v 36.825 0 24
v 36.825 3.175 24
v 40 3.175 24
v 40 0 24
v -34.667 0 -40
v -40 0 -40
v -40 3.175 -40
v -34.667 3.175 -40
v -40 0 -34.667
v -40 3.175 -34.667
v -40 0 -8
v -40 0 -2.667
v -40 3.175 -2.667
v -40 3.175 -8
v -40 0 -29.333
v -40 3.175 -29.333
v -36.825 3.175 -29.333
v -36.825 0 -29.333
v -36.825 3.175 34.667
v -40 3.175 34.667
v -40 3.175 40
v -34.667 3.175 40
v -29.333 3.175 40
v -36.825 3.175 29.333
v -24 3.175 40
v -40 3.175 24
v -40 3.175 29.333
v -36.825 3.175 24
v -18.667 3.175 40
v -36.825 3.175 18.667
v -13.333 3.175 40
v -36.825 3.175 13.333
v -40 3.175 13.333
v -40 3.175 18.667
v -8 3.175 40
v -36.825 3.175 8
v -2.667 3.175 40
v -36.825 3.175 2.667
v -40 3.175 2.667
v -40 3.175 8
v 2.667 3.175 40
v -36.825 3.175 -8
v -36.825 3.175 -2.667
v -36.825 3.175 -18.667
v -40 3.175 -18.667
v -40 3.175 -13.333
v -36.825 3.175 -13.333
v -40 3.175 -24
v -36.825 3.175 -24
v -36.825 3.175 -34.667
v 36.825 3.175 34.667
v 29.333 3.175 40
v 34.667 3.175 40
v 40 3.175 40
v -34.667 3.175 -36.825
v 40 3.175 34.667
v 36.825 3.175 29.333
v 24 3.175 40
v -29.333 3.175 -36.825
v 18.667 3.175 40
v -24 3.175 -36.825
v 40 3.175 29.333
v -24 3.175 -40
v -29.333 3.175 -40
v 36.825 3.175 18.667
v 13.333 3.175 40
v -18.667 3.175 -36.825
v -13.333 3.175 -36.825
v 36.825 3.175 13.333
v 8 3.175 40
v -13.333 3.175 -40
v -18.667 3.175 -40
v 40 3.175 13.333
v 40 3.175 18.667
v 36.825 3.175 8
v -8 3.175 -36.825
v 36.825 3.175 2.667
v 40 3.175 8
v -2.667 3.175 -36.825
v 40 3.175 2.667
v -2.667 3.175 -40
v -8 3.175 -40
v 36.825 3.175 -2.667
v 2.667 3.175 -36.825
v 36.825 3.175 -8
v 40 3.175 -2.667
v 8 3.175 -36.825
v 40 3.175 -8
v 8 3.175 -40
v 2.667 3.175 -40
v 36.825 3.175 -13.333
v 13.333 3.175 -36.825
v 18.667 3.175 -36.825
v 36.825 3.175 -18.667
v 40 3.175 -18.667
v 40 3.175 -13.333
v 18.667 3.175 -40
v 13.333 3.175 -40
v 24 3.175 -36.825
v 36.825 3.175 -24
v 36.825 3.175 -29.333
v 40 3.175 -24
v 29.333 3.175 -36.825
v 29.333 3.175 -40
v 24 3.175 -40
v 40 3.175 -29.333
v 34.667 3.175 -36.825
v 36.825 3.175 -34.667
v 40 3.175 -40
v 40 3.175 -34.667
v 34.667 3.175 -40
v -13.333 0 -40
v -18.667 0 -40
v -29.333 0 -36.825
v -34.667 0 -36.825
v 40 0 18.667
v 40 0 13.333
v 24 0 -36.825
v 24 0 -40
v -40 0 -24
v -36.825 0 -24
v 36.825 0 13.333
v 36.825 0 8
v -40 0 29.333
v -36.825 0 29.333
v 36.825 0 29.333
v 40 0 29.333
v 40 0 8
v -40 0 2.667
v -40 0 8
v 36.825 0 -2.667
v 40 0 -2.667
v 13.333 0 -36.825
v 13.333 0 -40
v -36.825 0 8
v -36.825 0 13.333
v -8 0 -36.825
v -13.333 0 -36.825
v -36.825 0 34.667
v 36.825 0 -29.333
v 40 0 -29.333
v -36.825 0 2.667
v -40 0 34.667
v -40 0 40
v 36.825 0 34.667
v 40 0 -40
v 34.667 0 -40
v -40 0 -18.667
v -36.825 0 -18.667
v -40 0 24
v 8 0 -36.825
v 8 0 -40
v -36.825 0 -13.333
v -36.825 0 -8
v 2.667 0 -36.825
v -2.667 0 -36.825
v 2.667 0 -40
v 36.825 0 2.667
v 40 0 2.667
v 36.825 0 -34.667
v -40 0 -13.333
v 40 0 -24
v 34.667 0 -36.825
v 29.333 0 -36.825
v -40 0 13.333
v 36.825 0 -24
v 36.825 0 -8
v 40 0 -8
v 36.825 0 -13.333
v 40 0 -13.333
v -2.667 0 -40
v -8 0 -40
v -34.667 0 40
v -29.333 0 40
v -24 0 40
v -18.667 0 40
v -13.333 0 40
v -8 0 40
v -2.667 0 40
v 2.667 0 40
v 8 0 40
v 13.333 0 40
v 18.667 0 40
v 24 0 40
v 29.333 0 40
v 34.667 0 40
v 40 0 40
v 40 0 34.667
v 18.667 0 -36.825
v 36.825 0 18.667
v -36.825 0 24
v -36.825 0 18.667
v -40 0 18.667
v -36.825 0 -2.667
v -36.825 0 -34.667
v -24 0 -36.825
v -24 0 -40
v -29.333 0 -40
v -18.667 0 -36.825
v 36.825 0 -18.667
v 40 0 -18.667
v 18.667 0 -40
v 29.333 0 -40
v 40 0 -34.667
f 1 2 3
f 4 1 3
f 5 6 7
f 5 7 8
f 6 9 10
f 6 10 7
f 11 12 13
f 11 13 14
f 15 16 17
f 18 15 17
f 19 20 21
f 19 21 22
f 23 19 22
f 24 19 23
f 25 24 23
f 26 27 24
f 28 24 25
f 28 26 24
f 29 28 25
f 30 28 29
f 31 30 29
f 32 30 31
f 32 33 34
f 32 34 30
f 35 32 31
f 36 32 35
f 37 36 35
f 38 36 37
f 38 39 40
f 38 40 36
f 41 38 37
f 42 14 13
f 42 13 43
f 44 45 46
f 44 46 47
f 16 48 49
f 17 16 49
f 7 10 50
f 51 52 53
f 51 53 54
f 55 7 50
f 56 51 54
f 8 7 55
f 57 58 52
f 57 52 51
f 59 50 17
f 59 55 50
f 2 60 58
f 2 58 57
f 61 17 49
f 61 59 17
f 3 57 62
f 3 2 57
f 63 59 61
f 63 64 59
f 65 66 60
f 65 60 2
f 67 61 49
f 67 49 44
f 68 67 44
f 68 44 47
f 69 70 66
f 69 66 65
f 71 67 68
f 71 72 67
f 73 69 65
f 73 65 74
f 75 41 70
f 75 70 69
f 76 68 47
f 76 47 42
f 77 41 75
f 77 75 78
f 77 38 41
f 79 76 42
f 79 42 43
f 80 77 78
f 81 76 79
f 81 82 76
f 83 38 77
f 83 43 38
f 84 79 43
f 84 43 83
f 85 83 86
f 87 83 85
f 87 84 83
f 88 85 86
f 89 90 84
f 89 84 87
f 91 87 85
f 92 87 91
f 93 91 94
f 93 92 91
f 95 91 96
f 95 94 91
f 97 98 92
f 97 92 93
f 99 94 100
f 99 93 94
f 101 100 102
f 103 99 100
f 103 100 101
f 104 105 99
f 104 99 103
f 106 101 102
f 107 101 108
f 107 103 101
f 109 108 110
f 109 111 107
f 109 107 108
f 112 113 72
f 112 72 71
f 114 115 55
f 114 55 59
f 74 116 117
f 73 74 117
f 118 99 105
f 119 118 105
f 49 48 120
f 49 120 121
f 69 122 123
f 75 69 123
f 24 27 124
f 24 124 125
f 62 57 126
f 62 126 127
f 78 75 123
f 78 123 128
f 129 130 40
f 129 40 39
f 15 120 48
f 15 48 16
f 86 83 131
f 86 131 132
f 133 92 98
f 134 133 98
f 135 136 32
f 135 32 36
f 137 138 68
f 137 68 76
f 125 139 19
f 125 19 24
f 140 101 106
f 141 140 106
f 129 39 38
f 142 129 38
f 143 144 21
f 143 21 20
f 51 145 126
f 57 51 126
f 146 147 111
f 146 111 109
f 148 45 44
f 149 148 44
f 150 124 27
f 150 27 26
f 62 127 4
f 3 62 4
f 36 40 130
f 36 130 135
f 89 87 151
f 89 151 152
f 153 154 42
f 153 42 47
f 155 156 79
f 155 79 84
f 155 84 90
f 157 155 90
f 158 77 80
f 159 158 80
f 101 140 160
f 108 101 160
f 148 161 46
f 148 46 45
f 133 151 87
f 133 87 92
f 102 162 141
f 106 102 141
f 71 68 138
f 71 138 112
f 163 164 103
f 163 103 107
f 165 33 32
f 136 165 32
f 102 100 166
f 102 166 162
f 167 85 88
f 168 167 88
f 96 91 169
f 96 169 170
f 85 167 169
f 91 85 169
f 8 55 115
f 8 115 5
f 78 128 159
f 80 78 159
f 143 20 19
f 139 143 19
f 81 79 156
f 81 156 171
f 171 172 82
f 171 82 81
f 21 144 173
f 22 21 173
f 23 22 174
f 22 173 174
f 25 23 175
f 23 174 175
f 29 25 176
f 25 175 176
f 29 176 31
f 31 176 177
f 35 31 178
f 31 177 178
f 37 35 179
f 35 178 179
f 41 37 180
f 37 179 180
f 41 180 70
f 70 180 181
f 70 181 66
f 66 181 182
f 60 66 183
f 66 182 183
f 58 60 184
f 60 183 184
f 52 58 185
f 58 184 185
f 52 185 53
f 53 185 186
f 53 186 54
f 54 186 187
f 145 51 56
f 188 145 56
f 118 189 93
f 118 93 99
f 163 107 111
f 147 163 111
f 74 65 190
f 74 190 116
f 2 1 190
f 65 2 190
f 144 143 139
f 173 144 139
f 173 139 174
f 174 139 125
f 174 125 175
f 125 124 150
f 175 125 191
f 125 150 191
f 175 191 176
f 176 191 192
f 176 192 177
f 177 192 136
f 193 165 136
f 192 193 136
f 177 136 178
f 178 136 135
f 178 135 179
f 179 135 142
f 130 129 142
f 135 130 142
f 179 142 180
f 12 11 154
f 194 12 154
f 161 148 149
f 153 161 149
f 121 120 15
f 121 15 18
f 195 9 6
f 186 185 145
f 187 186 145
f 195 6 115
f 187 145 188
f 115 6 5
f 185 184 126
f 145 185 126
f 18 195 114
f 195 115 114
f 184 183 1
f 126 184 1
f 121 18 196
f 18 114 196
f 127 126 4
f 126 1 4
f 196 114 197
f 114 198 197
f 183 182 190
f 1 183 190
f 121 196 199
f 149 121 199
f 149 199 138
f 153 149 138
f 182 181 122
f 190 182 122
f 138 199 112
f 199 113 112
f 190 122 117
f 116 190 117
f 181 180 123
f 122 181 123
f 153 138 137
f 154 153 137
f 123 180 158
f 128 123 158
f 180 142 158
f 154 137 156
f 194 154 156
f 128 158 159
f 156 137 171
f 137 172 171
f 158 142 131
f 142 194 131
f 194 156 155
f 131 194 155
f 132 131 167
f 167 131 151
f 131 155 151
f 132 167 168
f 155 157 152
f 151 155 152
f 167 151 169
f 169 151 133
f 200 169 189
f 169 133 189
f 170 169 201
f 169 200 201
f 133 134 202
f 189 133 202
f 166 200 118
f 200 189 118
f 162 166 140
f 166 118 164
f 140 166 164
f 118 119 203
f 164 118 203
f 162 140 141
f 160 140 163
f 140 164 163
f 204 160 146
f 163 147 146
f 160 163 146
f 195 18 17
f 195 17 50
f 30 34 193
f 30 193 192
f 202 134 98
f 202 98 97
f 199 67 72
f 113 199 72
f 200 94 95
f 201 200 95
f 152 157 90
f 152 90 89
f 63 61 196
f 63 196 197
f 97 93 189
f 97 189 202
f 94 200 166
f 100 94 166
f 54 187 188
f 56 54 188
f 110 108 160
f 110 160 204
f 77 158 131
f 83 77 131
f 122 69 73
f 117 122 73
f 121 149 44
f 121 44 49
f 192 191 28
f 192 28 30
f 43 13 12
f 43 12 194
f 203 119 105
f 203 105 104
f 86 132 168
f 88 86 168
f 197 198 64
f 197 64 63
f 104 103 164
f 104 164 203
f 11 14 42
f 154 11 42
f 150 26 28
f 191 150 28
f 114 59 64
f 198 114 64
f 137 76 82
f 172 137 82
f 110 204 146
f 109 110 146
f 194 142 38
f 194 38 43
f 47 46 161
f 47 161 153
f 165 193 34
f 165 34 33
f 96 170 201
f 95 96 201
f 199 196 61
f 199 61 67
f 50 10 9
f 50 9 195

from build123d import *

# Parameters (mm, degrees)
SKETCH1_W                = 80
SKETCH1_H                = 80
BOSS_EXTRUDE1_DEPTH      = 3.175
CUT_EXTRUDE3_START       = -3.175
CUT_EXTRUDE3_OUTLINE_W   = 3.175
CUT_EXTRUDE3_OUTLINE_H   = 5.333333334
CUT_EXTRUDE3_OUTLINE_H_2 = 5.333333333
CUT_EXTRUDE3_OUTLINE_W_2 = 5.333333334
CUT_EXTRUDE3_OUTLINE_H_3 = 3.175
CUT_EXTRUDE3_OUTLINE_W_3 = 5.333333333
CUT_EXTRUDE3_DEPTH       = 3.175
SKETCH3_W                = 80
SKETCH3_H                = 5.333333333
BOSS_EXTRUDE2_DEPTH      = 3.175


# Read off the part's stored shape, not the designer's step: Cut-Extrude3
with BuildPart() as part:
    # Sketch1 → Boss-Extrude1 (new body)
    with BuildSketch(Plane(origin=(0, 0, 0), x_dir=(1, 0, 0), z_dir=(0, 1, 0))):
        Rectangle(SKETCH1_W, SKETCH1_H)
    extrude(amount=BOSS_EXTRUDE1_DEPTH)

    # Cut-Extrude3 outline → Cut-Extrude3 (cut)
    with BuildSketch(Plane(origin=(0, 3.175, 0), x_dir=(1, 0, 0), z_dir=(0, 1, 0)).offset(CUT_EXTRUDE3_START)):
        with Locations((-38.4125, 32)):
            Rectangle(CUT_EXTRUDE3_OUTLINE_W, CUT_EXTRUDE3_OUTLINE_H)
        with Locations((-38.4125, 21.333333334)):
            Rectangle(CUT_EXTRUDE3_OUTLINE_W, CUT_EXTRUDE3_OUTLINE_H_2)
        with Locations((-32, 38.4125)):
            Rectangle(CUT_EXTRUDE3_OUTLINE_W_2, CUT_EXTRUDE3_OUTLINE_H_3)
        with Locations((-38.4125, 10.666666666)):
            Rectangle(CUT_EXTRUDE3_OUTLINE_W, CUT_EXTRUDE3_OUTLINE_H_2)
        with Locations((-21.333333334, 38.4125)):
            Rectangle(CUT_EXTRUDE3_OUTLINE_W_3, CUT_EXTRUDE3_OUTLINE_H_3)
        with Locations((-38.4125, 0)):
            Rectangle(CUT_EXTRUDE3_OUTLINE_W, CUT_EXTRUDE3_OUTLINE_H)
        with Locations((-10.666666666, 38.4125)):
            Rectangle(CUT_EXTRUDE3_OUTLINE_W_3, CUT_EXTRUDE3_OUTLINE_H_3)
        with Locations((-38.4125, -10.666666666)):
            Rectangle(CUT_EXTRUDE3_OUTLINE_W, CUT_EXTRUDE3_OUTLINE_H_2)
        with Locations((0, 38.4125)):
            Rectangle(CUT_EXTRUDE3_OUTLINE_W_2, CUT_EXTRUDE3_OUTLINE_H_3)
        with Locations((-38.4125, -21.333333334)):
            Rectangle(CUT_EXTRUDE3_OUTLINE_W, CUT_EXTRUDE3_OUTLINE_H_2)
        with Locations((10.666666666, 38.4125)):
            Rectangle(CUT_EXTRUDE3_OUTLINE_W_3, CUT_EXTRUDE3_OUTLINE_H_3)
        with Locations((-38.4125, -32)):
            Rectangle(CUT_EXTRUDE3_OUTLINE_W, CUT_EXTRUDE3_OUTLINE_H)
        with Locations((21.333333334, 38.4125)):
            Rectangle(CUT_EXTRUDE3_OUTLINE_W_3, CUT_EXTRUDE3_OUTLINE_H_3)
        with Locations((32, 38.4125)):
            Rectangle(CUT_EXTRUDE3_OUTLINE_W_2, CUT_EXTRUDE3_OUTLINE_H_3)
        with Locations((-32, -38.4125)):
            Rectangle(CUT_EXTRUDE3_OUTLINE_W_2, CUT_EXTRUDE3_OUTLINE_H_3)
        with Locations((-21.333333334, -38.4125)):
            Rectangle(CUT_EXTRUDE3_OUTLINE_W_3, CUT_EXTRUDE3_OUTLINE_H_3)
        with Locations((38.4125, 32)):
            Rectangle(CUT_EXTRUDE3_OUTLINE_W, CUT_EXTRUDE3_OUTLINE_H)
        with Locations((-10.666666666, -38.4125)):
            Rectangle(CUT_EXTRUDE3_OUTLINE_W_3, CUT_EXTRUDE3_OUTLINE_H_3)
        with Locations((38.4125, 21.333333334)):
            Rectangle(CUT_EXTRUDE3_OUTLINE_W, CUT_EXTRUDE3_OUTLINE_H_2)
        with Locations((0, -38.4125)):
            Rectangle(CUT_EXTRUDE3_OUTLINE_W_2, CUT_EXTRUDE3_OUTLINE_H_3)
        with Locations((38.4125, 10.666666666)):
            Rectangle(CUT_EXTRUDE3_OUTLINE_W, CUT_EXTRUDE3_OUTLINE_H_2)
        with Locations((10.666666666, -38.4125)):
            Rectangle(CUT_EXTRUDE3_OUTLINE_W_3, CUT_EXTRUDE3_OUTLINE_H_3)
        with Locations((38.4125, 0)):
            Rectangle(CUT_EXTRUDE3_OUTLINE_W, CUT_EXTRUDE3_OUTLINE_H)
        with Locations((21.333333334, -38.4125)):
            Rectangle(CUT_EXTRUDE3_OUTLINE_W_3, CUT_EXTRUDE3_OUTLINE_H_3)
        with Locations((38.4125, -10.666666666)):
            Rectangle(CUT_EXTRUDE3_OUTLINE_W, CUT_EXTRUDE3_OUTLINE_H_2)
        with Locations((32, -38.4125)):
            Rectangle(CUT_EXTRUDE3_OUTLINE_W_2, CUT_EXTRUDE3_OUTLINE_H_3)
        with Locations((38.4125, -21.333333334)):
            Rectangle(CUT_EXTRUDE3_OUTLINE_W, CUT_EXTRUDE3_OUTLINE_H_2)
        with Locations((38.4125, -32)):
            Rectangle(CUT_EXTRUDE3_OUTLINE_W, CUT_EXTRUDE3_OUTLINE_H)
    extrude(amount=CUT_EXTRUDE3_DEPTH, mode=Mode.SUBTRACT)

    # Sketch3 → Boss-Extrude2 (add)
    with BuildSketch(Plane.XZ):
        with Locations((0, 37.333333334)):
            Rectangle(SKETCH3_W, SKETCH3_H)
    extrude(amount=-BOSS_EXTRUDE2_DEPTH)


solid = part.part
